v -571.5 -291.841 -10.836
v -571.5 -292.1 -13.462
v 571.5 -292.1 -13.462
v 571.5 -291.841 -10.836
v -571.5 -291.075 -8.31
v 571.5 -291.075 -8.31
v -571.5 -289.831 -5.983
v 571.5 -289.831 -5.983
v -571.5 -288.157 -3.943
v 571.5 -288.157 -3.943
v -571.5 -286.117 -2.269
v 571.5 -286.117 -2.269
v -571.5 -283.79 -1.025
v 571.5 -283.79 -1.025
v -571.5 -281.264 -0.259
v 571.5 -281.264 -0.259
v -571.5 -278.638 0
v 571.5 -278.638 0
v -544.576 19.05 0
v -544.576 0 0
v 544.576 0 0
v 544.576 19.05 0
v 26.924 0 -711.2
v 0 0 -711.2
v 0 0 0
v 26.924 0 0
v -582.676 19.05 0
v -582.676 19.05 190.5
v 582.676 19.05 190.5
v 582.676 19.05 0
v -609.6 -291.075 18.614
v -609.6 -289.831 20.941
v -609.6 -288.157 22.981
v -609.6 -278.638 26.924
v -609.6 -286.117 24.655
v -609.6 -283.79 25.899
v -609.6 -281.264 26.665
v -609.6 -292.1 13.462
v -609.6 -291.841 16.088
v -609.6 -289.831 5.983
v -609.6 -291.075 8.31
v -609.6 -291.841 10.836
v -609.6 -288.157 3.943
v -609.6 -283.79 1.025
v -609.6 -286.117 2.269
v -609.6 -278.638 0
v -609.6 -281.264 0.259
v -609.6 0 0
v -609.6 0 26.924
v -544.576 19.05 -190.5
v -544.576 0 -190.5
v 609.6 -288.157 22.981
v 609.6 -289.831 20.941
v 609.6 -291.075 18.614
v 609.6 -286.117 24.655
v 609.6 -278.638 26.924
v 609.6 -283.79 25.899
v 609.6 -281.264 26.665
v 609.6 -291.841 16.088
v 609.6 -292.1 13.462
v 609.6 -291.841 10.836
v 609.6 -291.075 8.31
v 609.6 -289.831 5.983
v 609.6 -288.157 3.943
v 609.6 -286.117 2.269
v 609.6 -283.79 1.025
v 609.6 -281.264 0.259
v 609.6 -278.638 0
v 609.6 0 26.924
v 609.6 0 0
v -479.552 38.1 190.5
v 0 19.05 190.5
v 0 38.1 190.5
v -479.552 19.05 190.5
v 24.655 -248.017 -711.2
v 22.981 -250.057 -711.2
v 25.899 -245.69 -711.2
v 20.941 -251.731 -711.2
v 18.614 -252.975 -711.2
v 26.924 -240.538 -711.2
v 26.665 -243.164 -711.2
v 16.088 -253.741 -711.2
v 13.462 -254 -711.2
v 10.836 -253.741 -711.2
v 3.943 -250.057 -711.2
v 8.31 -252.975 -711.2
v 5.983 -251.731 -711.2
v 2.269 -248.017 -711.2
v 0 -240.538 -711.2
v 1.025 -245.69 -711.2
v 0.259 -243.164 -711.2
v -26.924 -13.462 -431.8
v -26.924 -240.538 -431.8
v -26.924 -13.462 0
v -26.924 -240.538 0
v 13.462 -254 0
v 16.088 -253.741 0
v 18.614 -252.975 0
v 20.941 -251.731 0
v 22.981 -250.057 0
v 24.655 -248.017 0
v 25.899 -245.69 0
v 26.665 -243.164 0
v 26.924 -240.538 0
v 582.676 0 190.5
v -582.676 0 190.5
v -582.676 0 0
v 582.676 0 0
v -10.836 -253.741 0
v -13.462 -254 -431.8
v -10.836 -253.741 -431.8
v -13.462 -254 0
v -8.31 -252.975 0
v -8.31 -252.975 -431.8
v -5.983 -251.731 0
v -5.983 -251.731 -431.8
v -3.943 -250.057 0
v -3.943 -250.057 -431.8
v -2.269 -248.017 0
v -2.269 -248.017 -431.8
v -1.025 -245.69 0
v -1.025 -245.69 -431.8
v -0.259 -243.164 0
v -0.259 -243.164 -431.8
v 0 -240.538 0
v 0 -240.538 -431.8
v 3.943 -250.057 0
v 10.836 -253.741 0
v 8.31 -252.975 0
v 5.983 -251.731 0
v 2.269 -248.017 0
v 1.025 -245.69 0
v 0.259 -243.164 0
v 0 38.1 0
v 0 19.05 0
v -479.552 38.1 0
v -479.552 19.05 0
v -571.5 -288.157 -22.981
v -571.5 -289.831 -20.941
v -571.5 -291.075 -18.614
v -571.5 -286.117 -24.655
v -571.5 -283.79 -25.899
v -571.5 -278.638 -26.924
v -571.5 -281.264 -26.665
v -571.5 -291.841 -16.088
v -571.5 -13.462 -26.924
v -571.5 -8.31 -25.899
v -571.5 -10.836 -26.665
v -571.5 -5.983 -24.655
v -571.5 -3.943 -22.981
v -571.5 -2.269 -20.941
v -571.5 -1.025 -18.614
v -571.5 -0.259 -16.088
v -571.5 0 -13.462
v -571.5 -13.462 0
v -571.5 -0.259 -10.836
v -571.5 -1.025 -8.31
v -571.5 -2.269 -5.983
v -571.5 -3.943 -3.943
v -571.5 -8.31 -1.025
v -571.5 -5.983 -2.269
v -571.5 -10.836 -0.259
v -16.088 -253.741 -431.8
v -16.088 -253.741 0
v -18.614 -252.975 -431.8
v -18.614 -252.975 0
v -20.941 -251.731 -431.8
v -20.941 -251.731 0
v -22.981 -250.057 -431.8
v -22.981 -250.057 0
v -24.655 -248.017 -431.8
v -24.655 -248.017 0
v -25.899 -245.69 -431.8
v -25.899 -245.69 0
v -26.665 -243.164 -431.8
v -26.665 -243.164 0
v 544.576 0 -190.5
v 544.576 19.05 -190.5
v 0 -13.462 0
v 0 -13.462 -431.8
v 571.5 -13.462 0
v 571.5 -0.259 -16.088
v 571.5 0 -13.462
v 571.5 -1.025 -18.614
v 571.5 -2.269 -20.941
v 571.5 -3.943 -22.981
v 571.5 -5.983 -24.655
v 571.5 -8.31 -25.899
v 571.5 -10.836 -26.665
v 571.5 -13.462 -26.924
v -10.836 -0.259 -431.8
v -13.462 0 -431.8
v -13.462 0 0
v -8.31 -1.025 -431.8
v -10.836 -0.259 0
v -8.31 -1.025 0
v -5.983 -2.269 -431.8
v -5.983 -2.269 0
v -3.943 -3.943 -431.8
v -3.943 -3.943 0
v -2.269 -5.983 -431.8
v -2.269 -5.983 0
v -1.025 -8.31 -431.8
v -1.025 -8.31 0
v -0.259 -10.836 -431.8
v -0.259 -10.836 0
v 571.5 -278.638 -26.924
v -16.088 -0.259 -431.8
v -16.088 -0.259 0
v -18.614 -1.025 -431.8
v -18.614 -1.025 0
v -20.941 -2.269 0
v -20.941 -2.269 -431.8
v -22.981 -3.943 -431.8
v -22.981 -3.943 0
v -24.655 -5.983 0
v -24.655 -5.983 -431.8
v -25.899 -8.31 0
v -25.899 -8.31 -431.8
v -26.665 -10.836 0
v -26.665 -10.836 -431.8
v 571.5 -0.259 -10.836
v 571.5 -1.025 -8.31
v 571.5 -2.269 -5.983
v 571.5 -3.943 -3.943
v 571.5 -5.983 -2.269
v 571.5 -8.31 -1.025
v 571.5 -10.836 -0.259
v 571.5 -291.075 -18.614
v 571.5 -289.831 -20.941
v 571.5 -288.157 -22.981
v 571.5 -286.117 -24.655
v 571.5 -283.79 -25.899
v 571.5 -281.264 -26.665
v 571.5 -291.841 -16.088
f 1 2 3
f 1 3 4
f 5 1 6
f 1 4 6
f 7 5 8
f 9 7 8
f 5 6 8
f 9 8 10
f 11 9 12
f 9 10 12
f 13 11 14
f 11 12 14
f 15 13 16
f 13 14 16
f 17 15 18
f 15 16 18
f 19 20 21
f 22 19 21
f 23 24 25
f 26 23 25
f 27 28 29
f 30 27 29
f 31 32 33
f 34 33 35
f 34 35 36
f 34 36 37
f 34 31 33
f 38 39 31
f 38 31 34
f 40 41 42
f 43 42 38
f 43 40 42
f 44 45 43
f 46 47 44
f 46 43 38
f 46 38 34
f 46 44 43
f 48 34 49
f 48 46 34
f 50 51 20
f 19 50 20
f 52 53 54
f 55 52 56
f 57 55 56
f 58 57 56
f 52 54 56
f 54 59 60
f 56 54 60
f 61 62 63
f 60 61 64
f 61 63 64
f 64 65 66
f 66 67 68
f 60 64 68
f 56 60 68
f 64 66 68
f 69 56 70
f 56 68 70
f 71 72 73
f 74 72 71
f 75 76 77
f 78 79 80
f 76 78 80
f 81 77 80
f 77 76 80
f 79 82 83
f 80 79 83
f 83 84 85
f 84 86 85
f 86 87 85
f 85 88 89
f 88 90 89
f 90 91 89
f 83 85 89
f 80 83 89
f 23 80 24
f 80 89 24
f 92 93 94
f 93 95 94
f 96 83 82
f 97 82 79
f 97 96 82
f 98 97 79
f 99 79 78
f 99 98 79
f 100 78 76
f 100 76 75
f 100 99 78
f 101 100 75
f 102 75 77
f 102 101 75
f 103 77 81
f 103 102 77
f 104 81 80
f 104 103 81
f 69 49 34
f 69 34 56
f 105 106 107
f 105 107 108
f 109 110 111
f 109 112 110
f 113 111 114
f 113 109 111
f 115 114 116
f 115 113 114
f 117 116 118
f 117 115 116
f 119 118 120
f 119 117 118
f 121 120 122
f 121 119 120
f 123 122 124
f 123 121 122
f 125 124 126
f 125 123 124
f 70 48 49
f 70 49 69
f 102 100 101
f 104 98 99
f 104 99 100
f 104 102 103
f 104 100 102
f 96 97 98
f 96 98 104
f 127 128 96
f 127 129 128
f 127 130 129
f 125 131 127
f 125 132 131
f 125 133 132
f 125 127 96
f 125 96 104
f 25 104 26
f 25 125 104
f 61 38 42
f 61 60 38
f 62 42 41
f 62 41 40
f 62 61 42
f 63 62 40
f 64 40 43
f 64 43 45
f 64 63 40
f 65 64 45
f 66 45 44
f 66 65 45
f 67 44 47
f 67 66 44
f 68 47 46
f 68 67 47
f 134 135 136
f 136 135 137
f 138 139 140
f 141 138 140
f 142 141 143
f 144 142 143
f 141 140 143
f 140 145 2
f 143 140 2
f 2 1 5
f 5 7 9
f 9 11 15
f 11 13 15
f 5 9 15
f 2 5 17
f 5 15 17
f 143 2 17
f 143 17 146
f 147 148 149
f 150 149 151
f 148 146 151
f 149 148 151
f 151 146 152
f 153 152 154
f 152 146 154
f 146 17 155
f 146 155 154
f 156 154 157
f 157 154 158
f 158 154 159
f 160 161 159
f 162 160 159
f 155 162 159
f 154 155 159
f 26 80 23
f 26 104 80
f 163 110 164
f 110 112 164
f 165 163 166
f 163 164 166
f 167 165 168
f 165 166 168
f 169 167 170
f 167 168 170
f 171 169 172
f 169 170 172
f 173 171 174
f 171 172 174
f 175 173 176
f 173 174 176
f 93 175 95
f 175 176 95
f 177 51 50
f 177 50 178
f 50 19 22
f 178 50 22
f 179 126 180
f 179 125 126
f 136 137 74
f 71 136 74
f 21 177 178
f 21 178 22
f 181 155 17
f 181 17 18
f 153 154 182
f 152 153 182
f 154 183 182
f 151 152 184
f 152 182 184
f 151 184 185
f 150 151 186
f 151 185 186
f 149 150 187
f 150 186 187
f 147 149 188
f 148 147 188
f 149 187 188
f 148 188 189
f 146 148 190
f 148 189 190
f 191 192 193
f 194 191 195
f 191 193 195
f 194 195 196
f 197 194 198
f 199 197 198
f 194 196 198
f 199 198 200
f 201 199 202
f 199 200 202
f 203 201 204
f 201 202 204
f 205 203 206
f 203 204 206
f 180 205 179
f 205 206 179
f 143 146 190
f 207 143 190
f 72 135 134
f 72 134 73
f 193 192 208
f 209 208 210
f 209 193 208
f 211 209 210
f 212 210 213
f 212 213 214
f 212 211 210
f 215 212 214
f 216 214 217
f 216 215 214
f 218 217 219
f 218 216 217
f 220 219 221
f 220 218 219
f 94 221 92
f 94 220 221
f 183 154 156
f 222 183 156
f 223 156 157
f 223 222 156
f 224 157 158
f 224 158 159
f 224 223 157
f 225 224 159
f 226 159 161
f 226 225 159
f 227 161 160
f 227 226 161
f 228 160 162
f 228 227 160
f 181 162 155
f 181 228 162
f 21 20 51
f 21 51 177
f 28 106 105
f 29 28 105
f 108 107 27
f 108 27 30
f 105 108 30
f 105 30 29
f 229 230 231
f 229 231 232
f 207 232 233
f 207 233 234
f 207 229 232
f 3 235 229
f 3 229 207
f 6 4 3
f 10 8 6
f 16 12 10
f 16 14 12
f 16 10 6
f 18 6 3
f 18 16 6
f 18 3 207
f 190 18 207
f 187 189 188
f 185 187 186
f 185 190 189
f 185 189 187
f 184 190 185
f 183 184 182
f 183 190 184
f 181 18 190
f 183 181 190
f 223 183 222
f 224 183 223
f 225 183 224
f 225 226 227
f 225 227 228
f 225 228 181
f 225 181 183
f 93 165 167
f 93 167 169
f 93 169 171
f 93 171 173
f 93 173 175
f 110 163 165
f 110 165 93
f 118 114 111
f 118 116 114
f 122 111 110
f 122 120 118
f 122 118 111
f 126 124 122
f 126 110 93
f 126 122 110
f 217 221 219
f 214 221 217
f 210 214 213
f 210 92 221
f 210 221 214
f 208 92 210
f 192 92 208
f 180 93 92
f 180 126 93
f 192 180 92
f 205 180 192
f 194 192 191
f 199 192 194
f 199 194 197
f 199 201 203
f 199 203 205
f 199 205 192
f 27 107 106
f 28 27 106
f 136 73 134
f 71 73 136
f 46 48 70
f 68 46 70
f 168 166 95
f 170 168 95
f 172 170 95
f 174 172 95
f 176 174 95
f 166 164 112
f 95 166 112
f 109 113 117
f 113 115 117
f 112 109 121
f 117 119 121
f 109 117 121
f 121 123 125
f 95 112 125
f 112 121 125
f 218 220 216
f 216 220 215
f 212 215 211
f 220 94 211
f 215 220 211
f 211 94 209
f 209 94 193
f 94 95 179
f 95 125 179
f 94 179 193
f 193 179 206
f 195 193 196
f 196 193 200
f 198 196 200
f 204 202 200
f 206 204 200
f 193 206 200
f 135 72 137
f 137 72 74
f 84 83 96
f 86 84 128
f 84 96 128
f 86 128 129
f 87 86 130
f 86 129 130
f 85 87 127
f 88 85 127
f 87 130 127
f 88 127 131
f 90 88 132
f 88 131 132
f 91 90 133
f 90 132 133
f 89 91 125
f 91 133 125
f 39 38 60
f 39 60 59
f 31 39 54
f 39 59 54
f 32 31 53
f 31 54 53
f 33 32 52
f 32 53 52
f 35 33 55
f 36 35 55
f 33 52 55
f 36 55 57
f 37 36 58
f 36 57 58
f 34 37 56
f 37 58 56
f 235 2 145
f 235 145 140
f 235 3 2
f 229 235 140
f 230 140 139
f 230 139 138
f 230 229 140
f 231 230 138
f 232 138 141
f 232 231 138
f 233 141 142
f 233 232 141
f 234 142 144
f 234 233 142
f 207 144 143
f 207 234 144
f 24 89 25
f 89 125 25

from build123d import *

# Parameters (mm, degrees)
F0_W      = 1219.2
F0_H      = 292.1
F1_DEPTH  = 26.924
F2_R      = 13.46199
F3_W      = 1165.352
F3_H      = 190.5
F4_DEPTH  = 19.05
F5_W      = 254
F5_H      = 711.2
F6_DEPTH  = 26.924
F7_W      = 254
F7_H      = 431.8
F8_DEPTH  = 26.924
F9_R      = 13.46199
F10_R     = 13.46199
F11_W     = 1143
F11_H     = 292.1
F12_DEPTH = 26.924
F13_R     = 13.46199
F14_W     = 1089.152
F14_H     = 190.5
F15_DEPTH = 19.05
F16_W     = 479.552
F16_H     = 190.5
F17_DEPTH = 19.05


# Not quite as in the source:
# - a fillet or chamfer is up to 0.001 mm smaller than in the source, because OpenCascade refuses the exact size


with BuildPart() as f1:
    # F0 (on Top) → F1 (new body)
    with BuildSketch(Plane.XY):
        with Locations((0, -146.05)):
            Rectangle(F0_W, F0_H)
    extrude(amount=F1_DEPTH)

    # F2 (radius 13.462 in the source; OpenCascade refuses exactly that, so slightly less here)
    f2_edges = [f1.edges().sort_by_distance(p)[0] for p in [
        (0, -292.1, 26.924),
        (0, -292.1, 0),
    ]]
    fillet(f2_edges, radius=F2_R)


with BuildPart() as f4:
    # F3 (on Front) → F4 (new body)
    with BuildSketch(Plane.XZ):
        with Locations((0, 95.25)):
            Rectangle(F3_W, F3_H)
    extrude(amount=-F4_DEPTH)


with BuildPart() as f6:
    # F5 (on Right) → F6 (new body)
    with BuildSketch(Plane.YZ):
        with Locations((-127, -355.6)):
            Rectangle(F5_W, F5_H)
    extrude(amount=F6_DEPTH)

    # F9 (radius 13.462 in the source; OpenCascade refuses exactly that, so slightly less here)
    f9_edges = [f6.edges().sort_by_distance(p)[0] for p in [
        (0, -254, -355.6),
        (26.924, -254, -355.6),
    ]]
    fillet(f9_edges, radius=F9_R)


with BuildPart() as f8:
    # F7 (on Right) → F8 (new body)
    with BuildSketch(Plane.YZ):
        with Locations((-127, -215.9)):
            Rectangle(F7_W, F7_H)
    extrude(amount=-F8_DEPTH)

    # F10 (radius 13.462 in the source; OpenCascade refuses exactly that, so slightly less here)
    f10_edges = [f8.edges().sort_by_distance(p)[0] for p in [
        (-26.924, -254, -215.9),
        (0, -254, -215.9),
        (-26.924, 0, -215.9),
        (0, 0, -215.9),
    ]]
    fillet(f10_edges, radius=F10_R)


with BuildPart() as f12:
    # F11 (on Top) → F12 (new body)
    with BuildSketch(Plane.XY):
        with Locations((0, -146.05)):
            Rectangle(F11_W, F11_H)
    extrude(amount=-F12_DEPTH)

    # F13 (radius 13.462 in the source; OpenCascade refuses exactly that, so slightly less here)
    f13_edges = [f12.edges().sort_by_distance(p)[0] for p in [
        (0, -292.1, 0),
        (0, -292.1, -26.924),
        (0, 0, -26.924),
        (0, 0, 0),
    ]]
    fillet(f13_edges, radius=F13_R)


with BuildPart() as f15:
    # F14 (on Front) → F15 (new body)
    with BuildSketch(Plane.XZ):
        with Locations((0, -95.25)):
            Rectangle(F14_W, F14_H)
    extrude(amount=-F15_DEPTH)


with BuildPart() as f17:
    # F16 (on face) → F17 (new body)
    with BuildSketch(Plane(origin=(0, 19.05, 0), x_dir=(-1, 0, 0), z_dir=(0, 1, 0))):
        with Locations((239.776, 95.25)):
            Rectangle(F16_W, F16_H)
    extrude(amount=F17_DEPTH)


solid = Compound([f1.part, f4.part, f6.part, f8.part, f12.part, f15.part, f17.part])
